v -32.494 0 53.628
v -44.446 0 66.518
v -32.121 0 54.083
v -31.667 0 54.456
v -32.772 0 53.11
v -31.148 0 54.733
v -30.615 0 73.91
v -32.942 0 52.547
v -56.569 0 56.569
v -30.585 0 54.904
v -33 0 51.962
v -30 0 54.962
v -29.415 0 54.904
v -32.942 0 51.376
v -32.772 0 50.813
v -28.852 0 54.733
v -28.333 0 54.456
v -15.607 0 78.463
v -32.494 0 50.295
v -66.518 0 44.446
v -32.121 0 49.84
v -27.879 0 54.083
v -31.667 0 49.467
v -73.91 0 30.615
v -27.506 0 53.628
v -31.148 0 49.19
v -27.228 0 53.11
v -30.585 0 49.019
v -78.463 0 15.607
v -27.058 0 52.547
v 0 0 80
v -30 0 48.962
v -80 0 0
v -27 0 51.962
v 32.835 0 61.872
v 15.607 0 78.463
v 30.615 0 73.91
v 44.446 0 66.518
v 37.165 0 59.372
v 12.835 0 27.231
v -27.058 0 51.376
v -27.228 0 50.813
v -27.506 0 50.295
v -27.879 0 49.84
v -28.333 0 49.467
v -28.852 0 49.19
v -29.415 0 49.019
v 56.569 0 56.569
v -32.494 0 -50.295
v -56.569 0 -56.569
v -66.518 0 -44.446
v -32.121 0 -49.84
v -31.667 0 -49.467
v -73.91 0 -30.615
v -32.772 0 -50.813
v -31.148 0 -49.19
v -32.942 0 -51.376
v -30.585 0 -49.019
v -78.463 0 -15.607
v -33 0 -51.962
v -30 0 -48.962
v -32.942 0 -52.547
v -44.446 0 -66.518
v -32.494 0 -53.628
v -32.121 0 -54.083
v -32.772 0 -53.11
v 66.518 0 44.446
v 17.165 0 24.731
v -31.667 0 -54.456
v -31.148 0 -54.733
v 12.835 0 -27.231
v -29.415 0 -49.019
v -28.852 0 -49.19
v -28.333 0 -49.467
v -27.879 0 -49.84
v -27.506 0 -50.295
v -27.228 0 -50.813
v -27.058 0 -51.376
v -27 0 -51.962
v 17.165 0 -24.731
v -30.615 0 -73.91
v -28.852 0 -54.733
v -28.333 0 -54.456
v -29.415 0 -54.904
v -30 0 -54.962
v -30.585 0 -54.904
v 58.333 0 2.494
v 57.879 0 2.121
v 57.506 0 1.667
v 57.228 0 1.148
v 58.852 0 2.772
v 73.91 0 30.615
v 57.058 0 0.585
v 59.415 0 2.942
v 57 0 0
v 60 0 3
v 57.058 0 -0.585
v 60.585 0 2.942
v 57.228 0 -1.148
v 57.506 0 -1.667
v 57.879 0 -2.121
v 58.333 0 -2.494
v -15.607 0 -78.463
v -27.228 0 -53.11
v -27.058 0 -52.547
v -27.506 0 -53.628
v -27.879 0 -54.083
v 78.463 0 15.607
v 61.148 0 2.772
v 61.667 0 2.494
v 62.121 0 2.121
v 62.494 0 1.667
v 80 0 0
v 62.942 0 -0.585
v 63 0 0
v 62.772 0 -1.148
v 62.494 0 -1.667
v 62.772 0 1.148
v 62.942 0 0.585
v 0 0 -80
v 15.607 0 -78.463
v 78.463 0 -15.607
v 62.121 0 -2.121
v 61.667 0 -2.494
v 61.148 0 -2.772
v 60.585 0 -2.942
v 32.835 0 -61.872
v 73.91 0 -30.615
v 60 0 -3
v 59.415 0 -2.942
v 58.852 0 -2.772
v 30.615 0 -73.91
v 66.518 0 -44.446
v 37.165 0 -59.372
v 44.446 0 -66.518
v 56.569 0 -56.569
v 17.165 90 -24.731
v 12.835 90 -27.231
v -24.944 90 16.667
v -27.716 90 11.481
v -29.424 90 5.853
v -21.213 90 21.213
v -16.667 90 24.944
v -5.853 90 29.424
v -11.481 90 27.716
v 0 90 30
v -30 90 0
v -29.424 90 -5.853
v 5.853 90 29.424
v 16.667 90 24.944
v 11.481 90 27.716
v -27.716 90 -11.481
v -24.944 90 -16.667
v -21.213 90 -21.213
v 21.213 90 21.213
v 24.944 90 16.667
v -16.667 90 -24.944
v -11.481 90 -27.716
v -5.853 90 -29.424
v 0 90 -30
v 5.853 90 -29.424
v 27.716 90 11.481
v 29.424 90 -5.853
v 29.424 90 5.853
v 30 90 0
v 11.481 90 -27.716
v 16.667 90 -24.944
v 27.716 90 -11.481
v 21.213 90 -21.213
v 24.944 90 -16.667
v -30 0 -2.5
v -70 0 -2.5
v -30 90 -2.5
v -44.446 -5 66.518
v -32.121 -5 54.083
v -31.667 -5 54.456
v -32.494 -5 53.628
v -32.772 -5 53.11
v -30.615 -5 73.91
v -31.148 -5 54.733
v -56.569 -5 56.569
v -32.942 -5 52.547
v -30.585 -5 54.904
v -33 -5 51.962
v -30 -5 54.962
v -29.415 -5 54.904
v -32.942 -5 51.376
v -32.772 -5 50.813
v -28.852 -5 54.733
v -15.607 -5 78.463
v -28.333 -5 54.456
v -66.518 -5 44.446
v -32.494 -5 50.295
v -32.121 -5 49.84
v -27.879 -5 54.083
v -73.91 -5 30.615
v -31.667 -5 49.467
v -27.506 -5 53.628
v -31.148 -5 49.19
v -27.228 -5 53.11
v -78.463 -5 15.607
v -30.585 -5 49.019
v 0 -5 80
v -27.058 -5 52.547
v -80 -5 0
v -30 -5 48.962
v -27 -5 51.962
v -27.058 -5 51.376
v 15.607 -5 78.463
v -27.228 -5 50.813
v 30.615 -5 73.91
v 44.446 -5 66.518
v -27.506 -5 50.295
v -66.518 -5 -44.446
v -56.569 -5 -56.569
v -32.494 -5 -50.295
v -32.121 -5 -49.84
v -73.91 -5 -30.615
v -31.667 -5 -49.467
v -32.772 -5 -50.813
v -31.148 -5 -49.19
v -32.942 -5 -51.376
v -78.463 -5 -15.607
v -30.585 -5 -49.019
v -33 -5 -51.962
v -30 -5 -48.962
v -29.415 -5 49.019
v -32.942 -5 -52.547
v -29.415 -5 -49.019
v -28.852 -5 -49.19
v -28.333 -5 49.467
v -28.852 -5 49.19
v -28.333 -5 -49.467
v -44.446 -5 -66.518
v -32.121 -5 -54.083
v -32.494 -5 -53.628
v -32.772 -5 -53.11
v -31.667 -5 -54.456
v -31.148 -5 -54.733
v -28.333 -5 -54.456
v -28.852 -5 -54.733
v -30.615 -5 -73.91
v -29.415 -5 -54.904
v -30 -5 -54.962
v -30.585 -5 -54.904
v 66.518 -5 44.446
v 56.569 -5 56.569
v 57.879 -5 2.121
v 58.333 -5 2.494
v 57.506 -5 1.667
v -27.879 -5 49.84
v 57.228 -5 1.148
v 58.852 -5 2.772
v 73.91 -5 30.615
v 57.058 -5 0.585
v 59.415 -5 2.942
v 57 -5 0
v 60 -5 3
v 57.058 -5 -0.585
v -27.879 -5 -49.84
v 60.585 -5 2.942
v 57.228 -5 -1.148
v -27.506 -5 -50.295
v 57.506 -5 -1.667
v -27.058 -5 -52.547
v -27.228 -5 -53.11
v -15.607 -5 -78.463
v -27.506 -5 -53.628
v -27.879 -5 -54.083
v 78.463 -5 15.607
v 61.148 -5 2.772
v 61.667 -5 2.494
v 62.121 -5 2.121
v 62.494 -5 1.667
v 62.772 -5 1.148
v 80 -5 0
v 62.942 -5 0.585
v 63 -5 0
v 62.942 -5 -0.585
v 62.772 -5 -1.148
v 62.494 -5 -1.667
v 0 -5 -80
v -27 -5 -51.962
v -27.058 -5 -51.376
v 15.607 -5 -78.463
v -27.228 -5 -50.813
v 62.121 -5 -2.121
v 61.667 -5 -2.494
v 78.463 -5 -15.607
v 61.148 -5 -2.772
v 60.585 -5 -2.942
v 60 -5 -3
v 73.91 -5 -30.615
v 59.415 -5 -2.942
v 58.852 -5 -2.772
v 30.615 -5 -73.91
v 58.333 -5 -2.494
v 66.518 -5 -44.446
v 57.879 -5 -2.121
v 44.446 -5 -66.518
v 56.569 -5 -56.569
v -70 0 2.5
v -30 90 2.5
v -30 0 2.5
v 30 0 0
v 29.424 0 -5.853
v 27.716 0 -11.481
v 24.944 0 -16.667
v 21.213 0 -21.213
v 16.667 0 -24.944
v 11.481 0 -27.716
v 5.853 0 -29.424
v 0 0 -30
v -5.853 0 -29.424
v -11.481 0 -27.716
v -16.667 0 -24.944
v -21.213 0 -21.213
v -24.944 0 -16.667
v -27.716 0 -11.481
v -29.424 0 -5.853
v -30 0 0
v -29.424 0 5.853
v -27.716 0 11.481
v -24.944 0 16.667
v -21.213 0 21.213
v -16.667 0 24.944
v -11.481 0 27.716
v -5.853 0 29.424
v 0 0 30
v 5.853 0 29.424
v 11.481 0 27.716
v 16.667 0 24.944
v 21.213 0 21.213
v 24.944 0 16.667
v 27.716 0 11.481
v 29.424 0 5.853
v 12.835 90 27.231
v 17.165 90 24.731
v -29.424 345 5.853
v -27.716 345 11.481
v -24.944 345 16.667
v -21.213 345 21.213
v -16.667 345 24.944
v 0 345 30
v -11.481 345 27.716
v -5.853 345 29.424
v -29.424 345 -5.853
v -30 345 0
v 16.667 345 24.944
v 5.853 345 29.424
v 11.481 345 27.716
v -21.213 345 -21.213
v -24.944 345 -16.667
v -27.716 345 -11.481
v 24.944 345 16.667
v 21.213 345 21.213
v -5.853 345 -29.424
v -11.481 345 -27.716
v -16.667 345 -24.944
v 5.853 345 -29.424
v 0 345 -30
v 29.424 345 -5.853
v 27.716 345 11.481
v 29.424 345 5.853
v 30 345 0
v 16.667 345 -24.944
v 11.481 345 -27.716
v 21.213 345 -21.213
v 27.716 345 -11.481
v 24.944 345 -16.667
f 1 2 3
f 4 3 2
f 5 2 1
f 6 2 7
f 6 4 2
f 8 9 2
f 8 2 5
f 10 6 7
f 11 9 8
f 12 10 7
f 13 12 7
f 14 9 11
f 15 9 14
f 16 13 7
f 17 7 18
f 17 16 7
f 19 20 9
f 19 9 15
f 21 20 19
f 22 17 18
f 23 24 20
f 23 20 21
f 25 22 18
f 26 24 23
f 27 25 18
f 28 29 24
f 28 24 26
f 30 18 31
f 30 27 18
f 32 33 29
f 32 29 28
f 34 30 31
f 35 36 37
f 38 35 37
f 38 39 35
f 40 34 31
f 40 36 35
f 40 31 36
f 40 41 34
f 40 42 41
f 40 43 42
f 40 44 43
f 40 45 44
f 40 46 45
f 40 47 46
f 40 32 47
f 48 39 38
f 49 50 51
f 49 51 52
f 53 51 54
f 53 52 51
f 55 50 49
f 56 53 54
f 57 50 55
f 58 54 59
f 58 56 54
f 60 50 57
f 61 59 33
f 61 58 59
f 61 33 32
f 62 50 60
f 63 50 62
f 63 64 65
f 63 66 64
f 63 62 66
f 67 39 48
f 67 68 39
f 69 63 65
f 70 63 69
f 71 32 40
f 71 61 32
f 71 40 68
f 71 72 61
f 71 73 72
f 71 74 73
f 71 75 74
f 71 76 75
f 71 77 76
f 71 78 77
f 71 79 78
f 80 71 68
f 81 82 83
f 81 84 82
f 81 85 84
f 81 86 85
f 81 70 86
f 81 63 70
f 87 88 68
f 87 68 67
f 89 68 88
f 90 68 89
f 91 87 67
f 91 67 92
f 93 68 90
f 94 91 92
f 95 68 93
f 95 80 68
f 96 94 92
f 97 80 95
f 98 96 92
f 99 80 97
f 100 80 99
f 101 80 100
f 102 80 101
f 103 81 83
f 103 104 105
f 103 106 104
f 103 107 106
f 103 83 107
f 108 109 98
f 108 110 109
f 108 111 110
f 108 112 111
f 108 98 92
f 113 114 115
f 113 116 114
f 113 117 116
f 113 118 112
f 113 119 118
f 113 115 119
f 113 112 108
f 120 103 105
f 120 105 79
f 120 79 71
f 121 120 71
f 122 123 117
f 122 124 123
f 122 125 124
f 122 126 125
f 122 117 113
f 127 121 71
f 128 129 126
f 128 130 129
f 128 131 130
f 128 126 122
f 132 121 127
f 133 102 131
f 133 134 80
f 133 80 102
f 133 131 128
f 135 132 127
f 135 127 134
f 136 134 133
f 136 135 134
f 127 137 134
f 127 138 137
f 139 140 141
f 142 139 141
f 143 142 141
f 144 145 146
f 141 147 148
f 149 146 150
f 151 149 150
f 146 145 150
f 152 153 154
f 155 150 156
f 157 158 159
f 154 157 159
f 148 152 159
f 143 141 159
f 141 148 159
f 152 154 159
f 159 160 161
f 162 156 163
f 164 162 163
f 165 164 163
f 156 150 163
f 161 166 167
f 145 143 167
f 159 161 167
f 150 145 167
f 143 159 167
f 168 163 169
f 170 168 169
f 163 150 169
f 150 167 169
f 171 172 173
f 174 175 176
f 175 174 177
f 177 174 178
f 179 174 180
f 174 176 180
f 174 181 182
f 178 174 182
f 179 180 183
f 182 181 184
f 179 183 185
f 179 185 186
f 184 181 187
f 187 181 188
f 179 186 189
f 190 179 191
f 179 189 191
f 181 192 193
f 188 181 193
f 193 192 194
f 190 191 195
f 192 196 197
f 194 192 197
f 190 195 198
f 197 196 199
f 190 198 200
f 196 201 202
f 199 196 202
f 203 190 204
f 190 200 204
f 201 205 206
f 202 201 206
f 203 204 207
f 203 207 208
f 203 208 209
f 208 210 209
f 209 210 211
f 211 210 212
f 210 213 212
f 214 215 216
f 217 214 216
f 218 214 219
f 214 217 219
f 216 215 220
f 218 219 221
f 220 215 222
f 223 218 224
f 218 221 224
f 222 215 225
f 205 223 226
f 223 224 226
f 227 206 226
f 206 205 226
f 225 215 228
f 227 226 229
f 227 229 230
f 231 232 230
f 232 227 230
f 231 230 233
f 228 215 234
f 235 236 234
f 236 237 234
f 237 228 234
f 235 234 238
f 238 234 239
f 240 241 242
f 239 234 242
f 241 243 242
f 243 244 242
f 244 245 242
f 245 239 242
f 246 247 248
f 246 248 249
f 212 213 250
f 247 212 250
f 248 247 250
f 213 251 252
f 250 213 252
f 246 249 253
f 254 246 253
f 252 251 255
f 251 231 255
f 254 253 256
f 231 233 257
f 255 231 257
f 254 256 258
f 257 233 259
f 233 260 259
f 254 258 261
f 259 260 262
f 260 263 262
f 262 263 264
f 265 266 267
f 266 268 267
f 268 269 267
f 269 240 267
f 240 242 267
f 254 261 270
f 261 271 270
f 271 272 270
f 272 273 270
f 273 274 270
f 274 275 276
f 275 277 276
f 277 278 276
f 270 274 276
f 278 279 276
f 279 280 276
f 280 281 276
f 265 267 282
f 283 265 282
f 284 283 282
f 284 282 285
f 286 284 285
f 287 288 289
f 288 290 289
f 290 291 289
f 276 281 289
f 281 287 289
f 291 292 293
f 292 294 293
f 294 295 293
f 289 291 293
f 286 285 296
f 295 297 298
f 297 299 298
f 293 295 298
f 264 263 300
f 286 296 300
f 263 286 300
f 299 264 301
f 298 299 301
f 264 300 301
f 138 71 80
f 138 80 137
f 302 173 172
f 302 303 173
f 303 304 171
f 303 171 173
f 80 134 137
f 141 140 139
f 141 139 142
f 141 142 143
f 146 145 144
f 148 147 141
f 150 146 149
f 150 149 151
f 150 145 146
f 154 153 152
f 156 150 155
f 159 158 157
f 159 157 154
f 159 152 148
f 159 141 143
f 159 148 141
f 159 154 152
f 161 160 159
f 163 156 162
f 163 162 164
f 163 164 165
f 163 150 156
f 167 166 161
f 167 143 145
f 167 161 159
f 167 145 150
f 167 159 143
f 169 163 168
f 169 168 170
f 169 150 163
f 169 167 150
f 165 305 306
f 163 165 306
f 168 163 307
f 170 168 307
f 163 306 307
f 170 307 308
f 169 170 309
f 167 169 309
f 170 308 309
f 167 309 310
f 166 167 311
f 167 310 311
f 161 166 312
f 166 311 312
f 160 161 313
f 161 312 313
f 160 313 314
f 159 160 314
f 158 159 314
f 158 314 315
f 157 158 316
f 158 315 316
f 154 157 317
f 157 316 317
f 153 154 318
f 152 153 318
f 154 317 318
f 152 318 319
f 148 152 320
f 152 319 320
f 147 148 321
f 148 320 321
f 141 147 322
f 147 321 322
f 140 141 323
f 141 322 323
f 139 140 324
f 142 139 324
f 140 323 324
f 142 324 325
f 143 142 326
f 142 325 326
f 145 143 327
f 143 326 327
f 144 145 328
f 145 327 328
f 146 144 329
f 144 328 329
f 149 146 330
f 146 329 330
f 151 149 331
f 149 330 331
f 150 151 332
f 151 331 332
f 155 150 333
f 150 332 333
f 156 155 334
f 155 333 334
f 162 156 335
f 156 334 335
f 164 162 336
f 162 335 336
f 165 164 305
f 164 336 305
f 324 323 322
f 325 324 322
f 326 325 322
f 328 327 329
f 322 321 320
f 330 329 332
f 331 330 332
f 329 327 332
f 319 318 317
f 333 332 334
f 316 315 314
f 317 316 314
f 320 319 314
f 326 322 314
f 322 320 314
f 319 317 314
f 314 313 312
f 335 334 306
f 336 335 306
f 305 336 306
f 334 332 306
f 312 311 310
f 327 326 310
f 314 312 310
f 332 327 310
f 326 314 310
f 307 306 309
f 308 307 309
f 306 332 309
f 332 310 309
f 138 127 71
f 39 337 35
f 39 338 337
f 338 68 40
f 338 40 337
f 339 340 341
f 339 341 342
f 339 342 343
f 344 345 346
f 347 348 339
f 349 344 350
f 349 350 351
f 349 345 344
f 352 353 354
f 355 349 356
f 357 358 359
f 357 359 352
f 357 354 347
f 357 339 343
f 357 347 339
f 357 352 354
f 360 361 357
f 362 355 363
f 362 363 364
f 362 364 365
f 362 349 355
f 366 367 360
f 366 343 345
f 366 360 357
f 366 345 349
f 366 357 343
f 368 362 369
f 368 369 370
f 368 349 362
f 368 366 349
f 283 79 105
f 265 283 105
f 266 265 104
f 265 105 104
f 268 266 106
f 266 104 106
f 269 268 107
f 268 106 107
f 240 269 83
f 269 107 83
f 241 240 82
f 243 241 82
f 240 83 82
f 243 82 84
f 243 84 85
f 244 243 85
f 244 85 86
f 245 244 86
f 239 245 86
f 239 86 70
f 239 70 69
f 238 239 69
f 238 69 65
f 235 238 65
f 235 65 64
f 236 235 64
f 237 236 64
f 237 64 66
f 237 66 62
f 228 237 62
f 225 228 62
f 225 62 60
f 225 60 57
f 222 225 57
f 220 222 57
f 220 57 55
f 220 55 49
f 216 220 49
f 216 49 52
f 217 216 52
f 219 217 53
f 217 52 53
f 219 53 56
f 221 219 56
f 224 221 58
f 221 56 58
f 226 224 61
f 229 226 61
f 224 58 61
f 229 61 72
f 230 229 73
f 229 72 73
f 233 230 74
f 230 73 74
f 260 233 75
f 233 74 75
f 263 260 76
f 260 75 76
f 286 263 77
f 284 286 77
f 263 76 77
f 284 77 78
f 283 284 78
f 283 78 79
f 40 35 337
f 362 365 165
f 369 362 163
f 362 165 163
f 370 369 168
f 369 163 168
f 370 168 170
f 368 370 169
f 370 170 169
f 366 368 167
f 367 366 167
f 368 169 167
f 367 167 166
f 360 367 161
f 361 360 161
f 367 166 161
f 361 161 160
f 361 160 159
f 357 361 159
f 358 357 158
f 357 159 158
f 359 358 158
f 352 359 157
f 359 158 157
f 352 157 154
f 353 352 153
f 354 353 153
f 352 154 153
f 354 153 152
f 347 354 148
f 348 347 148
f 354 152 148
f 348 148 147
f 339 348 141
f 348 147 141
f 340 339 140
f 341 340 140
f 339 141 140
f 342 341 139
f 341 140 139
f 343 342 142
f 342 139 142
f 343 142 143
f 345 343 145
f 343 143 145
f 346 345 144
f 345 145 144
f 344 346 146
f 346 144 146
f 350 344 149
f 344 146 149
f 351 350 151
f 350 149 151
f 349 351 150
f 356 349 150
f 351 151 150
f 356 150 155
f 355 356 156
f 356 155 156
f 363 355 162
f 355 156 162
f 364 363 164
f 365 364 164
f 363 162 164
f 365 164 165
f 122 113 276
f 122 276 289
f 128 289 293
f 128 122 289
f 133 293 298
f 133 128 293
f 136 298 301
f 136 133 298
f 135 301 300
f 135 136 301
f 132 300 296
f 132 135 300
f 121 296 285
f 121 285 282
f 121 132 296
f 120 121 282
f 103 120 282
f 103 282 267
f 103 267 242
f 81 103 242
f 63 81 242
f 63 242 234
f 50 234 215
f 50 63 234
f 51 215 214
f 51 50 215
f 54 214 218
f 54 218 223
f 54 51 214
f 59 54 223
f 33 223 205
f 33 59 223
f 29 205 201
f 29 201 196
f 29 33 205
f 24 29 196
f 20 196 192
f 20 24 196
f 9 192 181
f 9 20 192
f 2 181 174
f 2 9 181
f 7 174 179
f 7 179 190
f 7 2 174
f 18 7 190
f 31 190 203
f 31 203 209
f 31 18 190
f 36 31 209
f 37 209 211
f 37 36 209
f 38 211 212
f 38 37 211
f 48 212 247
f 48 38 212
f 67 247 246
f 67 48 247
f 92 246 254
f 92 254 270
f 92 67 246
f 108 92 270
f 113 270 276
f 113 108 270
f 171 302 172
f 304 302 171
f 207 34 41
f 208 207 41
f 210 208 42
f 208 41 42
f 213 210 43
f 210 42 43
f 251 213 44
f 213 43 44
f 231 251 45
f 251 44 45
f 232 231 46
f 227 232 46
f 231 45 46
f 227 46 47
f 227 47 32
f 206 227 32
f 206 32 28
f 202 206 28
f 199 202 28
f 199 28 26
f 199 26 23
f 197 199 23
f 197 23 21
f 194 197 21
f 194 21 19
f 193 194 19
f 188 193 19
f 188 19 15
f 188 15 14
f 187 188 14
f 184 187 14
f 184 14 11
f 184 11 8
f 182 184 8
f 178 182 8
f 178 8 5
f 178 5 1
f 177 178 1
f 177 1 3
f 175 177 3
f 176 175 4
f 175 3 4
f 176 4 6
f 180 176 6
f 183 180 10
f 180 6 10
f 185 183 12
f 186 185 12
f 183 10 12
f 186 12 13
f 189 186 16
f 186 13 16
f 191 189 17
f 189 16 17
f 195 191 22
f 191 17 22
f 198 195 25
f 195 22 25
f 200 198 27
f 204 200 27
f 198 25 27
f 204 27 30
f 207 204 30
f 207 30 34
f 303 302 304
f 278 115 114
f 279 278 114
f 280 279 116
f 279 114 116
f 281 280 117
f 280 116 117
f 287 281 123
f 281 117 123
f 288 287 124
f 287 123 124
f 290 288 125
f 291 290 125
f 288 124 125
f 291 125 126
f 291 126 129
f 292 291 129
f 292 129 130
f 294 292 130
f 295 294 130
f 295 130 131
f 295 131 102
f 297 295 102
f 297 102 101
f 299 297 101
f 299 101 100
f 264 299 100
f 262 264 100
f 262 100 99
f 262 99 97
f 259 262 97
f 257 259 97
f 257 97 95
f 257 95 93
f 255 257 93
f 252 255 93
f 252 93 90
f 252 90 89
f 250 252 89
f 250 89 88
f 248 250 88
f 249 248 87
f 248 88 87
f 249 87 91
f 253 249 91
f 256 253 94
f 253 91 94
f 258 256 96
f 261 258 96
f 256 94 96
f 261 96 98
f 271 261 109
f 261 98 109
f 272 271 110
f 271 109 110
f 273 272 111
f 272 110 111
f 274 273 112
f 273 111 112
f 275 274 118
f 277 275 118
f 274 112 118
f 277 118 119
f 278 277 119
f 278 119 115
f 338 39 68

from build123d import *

# Parameters (mm, degrees)
SKETCH1_R           = 80
BOSS_EXTRUDE1_DEPTH = 5
SKETCH2_R           = 30
BOSS_EXTRUDE2_DEPTH = 90
SKETCH3_R           = 30
BOSS_EXTRUDE3_DEPTH = 255
BOSS_EXTRUDE4_DEPTH = 2.5
CIRPATTERN1_COUNT   = 3
SKETCH5_R           = 3
CUT_EXTRUDE1_DEPTH  = 364.077126793


with BuildPart() as part:
    # Sketch1 → Boss-Extrude1 (new body)
    with BuildSketch(Plane(origin=(0, 0, 0), x_dir=(1, 0, 0), z_dir=(0, 1, 0))):
        Circle(SKETCH1_R)
    extrude(amount=-BOSS_EXTRUDE1_DEPTH)


with BuildPart() as body_2:
    # Sketch2 → Boss-Extrude2 (new body)
    with BuildSketch(Plane(origin=(0, 0, 0), x_dir=(1, 0, 0), z_dir=(0, 1, 0))):
        Circle(SKETCH2_R)
    extrude(amount=BOSS_EXTRUDE2_DEPTH)


with BuildPart() as body_3:
    # Sketch3 → Boss-Extrude3 (new body)
    with BuildSketch(Plane(origin=(0, 90, 0), x_dir=(1, 0, 0), z_dir=(0, 1, 0))):
        Circle(SKETCH3_R)
    extrude(amount=BOSS_EXTRUDE3_DEPTH)


with BuildPart() as body_4:
    # Sketch4 → Boss-Extrude4 (new, symmetric)
    with BuildSketch(Plane.XY):
        Polygon((-70, 0), (-30, 0), (-30, 90), align=None)
    boss_extrude4 = extrude(amount=BOSS_EXTRUDE4_DEPTH, both=True)


with BuildPart() as part_1:
    add(part.part)

    # CirPattern1: Boss-Extrude4 ×3 about axis
    cirpattern1_axis = Axis((0, 90, 0), (0, -1, 0))
    for i in range(1, CIRPATTERN1_COUNT):
        add(boss_extrude4.rotate(cirpattern1_axis, i * 360 / CIRPATTERN1_COUNT))

    # Sketch5 → Cut-Extrude1 (cut, through all)
    with BuildSketch(Plane(origin=(0, 0, 0), x_dir=(1, 0, 0), z_dir=(0, 1, 0))):
        with Locations((-30, 51.961524227)):
            Circle(SKETCH5_R)
        with Locations((60, 0)):
            Circle(SKETCH5_R)
        with Locations((-30, -51.961524227)):
            Circle(SKETCH5_R)
    extrude(amount=-CUT_EXTRUDE1_DEPTH, mode=Mode.SUBTRACT)


solid = Compound([body_2.part, body_3.part, body_4.part, part_1.part])
